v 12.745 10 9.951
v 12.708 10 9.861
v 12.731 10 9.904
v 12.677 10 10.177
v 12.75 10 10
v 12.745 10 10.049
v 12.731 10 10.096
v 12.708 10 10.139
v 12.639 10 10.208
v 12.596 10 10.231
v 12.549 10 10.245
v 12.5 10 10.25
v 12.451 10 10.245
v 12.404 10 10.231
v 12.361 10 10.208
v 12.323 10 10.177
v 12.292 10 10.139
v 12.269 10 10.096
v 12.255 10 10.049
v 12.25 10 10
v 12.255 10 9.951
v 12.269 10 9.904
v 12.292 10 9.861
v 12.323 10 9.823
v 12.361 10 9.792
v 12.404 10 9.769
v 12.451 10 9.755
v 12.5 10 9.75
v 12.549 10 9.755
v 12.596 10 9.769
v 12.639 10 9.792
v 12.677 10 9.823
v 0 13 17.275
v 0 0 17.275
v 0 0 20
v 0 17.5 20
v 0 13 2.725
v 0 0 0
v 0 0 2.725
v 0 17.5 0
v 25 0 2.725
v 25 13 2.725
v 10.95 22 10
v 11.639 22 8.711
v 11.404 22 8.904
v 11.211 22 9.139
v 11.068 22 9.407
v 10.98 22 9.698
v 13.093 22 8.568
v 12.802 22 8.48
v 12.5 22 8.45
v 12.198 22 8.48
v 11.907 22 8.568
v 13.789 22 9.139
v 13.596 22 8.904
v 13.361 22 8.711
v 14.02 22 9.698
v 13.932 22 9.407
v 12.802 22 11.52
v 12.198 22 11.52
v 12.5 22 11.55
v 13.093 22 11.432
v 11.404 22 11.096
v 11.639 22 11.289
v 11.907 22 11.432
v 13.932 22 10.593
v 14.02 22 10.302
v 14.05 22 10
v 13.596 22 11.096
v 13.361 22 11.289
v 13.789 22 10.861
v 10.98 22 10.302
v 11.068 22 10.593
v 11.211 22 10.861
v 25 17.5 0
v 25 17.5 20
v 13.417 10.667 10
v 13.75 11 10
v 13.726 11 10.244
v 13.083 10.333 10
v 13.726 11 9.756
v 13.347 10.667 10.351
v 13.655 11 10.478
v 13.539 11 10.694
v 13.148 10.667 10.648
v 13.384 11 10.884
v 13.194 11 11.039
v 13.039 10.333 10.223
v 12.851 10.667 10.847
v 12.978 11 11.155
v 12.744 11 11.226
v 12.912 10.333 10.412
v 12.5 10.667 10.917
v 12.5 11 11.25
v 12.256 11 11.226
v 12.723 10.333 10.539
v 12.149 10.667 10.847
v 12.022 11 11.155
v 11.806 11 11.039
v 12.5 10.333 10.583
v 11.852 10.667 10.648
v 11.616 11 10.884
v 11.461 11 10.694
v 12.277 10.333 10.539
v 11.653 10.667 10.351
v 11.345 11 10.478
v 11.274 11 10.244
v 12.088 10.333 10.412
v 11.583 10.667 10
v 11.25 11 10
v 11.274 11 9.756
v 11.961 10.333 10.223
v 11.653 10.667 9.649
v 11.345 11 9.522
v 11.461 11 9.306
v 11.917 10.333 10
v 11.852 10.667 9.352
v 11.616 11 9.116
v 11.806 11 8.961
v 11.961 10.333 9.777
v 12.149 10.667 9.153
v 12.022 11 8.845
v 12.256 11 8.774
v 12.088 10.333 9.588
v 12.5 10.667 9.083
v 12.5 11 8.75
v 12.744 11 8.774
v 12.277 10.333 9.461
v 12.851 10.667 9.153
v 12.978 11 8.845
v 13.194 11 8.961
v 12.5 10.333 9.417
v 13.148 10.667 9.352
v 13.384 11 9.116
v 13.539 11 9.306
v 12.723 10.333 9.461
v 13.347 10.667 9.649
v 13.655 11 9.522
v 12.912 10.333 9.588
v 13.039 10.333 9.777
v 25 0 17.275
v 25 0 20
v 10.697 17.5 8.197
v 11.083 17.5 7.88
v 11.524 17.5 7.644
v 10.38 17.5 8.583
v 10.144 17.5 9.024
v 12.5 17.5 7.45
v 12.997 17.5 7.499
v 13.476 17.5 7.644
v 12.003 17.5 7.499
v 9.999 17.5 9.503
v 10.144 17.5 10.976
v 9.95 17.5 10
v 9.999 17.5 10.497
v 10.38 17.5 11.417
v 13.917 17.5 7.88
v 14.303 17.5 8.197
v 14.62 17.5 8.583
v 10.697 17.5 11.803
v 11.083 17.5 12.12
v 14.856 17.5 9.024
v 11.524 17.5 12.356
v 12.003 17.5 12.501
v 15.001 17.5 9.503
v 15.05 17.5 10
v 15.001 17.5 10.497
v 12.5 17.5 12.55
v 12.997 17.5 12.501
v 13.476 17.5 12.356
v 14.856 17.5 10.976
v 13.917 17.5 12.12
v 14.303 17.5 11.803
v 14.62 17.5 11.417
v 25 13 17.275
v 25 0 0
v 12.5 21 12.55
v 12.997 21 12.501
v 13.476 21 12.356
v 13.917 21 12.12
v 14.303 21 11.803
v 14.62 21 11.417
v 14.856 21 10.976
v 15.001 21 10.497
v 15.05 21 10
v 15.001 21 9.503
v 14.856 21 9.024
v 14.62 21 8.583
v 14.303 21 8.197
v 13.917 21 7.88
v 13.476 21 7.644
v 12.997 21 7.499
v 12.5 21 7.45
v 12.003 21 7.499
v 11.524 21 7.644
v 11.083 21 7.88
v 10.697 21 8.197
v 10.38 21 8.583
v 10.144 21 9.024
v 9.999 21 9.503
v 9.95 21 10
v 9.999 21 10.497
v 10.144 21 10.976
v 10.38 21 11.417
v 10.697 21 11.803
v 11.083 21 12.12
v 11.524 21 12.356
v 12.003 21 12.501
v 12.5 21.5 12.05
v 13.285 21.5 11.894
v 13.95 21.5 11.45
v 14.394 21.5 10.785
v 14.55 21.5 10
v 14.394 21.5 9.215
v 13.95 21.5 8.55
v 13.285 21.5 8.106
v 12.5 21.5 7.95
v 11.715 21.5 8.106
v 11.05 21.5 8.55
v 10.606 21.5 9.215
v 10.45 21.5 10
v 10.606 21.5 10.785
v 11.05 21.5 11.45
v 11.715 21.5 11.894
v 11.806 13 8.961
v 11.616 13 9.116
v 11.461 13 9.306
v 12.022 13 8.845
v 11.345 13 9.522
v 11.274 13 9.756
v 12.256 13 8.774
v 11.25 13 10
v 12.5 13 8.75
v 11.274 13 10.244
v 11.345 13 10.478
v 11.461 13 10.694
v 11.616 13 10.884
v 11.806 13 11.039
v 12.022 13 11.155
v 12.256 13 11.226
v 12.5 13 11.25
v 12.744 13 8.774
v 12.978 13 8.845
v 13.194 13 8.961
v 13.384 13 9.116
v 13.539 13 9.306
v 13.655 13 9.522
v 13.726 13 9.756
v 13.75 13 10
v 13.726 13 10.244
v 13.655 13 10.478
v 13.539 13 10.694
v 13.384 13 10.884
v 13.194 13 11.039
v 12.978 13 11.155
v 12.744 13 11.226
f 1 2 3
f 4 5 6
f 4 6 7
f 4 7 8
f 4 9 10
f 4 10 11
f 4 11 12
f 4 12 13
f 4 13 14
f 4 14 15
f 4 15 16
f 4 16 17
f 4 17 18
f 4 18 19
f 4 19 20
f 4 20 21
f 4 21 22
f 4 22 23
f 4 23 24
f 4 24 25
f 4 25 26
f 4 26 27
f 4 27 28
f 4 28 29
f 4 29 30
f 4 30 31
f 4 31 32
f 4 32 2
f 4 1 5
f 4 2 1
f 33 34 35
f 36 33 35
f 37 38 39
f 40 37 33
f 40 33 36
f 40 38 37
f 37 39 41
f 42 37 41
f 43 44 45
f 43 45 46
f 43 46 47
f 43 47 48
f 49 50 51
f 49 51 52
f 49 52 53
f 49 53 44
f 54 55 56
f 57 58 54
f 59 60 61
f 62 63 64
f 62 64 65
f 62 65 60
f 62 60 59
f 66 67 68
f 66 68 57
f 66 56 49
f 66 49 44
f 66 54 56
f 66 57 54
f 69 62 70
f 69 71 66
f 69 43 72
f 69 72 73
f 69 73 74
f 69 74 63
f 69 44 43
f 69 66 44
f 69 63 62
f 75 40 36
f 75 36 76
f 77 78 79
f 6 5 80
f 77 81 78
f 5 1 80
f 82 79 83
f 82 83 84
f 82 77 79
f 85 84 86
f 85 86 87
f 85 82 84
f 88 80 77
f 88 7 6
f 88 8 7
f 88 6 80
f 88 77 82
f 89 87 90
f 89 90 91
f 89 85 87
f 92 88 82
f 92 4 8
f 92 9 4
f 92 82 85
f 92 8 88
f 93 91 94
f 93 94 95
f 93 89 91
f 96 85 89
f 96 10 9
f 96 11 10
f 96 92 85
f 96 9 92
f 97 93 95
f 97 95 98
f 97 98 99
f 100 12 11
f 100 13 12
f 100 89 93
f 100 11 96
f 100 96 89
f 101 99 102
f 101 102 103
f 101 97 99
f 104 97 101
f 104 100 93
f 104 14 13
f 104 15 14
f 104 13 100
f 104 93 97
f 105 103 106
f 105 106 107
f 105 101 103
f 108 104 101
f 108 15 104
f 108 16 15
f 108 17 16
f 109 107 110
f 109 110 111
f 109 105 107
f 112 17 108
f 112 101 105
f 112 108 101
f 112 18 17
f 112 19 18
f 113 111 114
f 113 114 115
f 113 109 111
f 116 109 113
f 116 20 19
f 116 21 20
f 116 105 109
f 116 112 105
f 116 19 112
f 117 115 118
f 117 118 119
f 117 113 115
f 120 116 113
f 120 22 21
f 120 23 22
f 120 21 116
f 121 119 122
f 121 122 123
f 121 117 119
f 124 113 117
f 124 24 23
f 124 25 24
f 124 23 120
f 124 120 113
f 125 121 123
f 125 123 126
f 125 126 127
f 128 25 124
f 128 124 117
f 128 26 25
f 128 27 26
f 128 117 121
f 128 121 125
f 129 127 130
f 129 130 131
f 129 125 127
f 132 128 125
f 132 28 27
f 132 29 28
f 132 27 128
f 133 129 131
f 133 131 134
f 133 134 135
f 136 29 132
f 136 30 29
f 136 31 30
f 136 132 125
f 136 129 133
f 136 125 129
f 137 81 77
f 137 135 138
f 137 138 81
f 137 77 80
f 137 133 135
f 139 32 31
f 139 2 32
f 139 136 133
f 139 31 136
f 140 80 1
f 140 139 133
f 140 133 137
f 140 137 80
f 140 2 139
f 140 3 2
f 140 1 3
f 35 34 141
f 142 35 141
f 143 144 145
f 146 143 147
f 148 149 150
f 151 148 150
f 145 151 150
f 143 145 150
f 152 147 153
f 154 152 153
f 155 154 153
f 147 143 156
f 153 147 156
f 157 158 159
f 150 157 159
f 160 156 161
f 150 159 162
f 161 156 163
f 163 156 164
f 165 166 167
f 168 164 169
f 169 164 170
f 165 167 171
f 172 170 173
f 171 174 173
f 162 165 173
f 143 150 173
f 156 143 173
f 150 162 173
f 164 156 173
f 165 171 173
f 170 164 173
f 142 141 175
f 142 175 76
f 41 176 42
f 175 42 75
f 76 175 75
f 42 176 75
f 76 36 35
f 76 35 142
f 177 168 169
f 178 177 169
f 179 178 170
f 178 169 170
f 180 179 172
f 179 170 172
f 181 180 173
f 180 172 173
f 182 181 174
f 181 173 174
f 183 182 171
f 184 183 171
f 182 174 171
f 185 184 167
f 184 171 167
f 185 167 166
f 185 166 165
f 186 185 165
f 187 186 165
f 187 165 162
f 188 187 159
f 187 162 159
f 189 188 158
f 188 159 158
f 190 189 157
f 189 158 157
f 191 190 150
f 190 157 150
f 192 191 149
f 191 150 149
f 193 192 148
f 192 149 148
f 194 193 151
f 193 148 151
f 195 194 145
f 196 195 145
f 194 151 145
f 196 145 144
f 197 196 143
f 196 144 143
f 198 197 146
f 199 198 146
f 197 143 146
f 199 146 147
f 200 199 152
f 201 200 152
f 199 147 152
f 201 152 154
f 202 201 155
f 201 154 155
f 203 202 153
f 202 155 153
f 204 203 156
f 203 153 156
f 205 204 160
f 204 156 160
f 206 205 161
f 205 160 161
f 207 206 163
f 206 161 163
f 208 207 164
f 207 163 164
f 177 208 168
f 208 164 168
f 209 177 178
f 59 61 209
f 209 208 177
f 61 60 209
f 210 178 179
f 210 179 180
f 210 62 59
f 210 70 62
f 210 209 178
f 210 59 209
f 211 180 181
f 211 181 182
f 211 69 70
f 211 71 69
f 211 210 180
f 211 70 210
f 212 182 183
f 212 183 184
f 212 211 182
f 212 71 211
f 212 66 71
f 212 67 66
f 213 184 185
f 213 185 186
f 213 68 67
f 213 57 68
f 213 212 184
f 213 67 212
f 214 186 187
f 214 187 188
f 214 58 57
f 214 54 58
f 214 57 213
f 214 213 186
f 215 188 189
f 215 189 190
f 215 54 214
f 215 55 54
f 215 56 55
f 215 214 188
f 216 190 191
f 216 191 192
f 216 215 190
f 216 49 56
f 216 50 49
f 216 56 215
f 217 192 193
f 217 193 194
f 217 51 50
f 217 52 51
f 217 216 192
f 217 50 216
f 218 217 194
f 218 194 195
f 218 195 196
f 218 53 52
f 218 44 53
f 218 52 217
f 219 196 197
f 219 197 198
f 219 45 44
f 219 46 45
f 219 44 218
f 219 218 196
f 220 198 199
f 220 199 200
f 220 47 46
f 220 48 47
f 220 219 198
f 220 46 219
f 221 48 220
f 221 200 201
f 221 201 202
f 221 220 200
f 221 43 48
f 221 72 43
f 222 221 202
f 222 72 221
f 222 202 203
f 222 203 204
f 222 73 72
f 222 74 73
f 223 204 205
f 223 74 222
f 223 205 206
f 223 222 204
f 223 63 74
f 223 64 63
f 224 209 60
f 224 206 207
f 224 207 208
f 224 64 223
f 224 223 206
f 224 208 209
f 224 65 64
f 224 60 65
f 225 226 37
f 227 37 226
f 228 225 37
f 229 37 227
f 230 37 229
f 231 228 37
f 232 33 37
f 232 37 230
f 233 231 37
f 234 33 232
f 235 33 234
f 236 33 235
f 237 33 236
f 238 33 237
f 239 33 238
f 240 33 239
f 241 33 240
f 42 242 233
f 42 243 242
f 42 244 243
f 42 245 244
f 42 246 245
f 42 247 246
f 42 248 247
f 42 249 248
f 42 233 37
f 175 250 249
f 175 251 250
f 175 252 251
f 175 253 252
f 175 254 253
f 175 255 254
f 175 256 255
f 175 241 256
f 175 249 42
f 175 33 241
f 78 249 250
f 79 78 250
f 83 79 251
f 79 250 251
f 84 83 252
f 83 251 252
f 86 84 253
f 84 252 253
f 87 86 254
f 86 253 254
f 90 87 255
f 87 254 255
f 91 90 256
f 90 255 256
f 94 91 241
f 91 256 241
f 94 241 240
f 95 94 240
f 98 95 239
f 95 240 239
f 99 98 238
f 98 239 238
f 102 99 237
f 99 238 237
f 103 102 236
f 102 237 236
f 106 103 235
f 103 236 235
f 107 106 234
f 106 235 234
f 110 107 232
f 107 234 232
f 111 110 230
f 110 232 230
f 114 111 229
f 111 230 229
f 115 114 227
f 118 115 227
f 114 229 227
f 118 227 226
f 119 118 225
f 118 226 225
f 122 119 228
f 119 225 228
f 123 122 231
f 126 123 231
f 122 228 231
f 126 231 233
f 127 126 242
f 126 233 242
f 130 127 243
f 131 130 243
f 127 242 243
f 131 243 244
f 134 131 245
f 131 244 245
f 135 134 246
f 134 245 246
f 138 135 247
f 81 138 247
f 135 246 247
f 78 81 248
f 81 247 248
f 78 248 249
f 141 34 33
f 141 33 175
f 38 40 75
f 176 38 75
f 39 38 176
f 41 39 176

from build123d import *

# Parameters (mm, degrees)
SKETCH1_W           = 25
SKETCH1_H           = 17.5
BOSS_EXTRUDE1_DEPTH = 20
SKETCH2_W           = 25
SKETCH2_H           = 14.55
CUT_EXTRUDE1_DEPTH  = 13
SKETCH4_R           = 2.55
BOSS_EXTRUDE2_DEPTH = 4.5
CHAMFER1_SIZE       = 1
SKETCH5_R           = 1.25
BOSS_EXTRUDE3_DEPTH = 3
CHAMFER2_SIZE       = 1


with BuildPart() as part:
    # Sketch1 → Boss-Extrude1 (new body)
    with BuildSketch(Plane.XY):
        with Locations((12.5, 8.75)):
            Rectangle(SKETCH1_W, SKETCH1_H)
    extrude(amount=BOSS_EXTRUDE1_DEPTH)

    # Sketch2 → Cut-Extrude1 (cut)
    with BuildSketch(Plane.XZ):
        with Locations((12.5, 10)):
            Rectangle(SKETCH2_W, SKETCH2_H)
    extrude(amount=-CUT_EXTRUDE1_DEPTH, mode=Mode.SUBTRACT)

    # Sketch5 → Boss-Extrude3 (add)
    with BuildSketch(Plane(origin=(0, 13, 0), x_dir=(-1, 0, 0), z_dir=(0, -1, 0))):
        with Locations(Location((-12.5, -10, 0), (0, 0, 180))):
            Circle(SKETCH5_R)
    extrude(amount=BOSS_EXTRUDE3_DEPTH)

    # Chamfer2
    chamfer2_edges = [part.edges().sort_by_distance(p)[0] for p in [
        (11.25, 10, 10),
    ]]
    chamfer(chamfer2_edges, length=CHAMFER2_SIZE)


with BuildPart() as body_2:
    # Sketch4 → Boss-Extrude2 (new body)
    with BuildSketch(Plane(origin=(0, 17.5, 0), x_dir=(1, 0, 0), z_dir=(0, 1, 0))):
        with Locations(Location((12.5, -10, 0), (0, 0, 270))):
            Circle(SKETCH4_R)
    extrude(amount=BOSS_EXTRUDE2_DEPTH)

    # Chamfer1
    chamfer1_edges = [body_2.edges().sort_by_distance(p)[0] for p in [
        (12.5, 22, 7.45),
    ]]
    chamfer(chamfer1_edges, length=CHAMFER1_SIZE)


solid = Compound([part.part, body_2.part])
